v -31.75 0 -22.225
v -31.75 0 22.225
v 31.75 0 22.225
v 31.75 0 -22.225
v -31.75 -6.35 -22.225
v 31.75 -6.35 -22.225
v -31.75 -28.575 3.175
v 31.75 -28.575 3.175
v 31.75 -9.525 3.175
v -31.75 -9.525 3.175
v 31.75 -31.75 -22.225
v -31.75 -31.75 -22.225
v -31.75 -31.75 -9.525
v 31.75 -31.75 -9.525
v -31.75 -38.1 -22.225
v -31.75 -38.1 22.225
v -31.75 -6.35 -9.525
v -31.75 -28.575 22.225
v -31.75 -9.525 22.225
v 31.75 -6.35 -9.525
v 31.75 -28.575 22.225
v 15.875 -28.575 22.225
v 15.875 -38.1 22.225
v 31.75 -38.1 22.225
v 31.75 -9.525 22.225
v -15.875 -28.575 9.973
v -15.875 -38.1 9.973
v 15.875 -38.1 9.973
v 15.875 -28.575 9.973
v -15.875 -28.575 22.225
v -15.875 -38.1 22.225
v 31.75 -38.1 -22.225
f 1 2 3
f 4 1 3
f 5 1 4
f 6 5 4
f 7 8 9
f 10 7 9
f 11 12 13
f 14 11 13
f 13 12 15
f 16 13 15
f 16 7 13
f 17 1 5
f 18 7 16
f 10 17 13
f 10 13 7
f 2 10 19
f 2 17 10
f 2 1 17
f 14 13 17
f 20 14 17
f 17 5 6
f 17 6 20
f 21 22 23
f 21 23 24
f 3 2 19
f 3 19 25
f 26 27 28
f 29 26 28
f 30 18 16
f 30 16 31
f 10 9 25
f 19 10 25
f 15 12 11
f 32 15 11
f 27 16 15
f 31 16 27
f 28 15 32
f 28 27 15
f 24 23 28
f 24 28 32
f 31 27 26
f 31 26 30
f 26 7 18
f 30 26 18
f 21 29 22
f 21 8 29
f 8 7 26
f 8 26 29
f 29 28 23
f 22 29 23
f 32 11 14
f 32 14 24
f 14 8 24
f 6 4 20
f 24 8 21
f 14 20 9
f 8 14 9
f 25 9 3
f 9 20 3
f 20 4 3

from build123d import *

# Parameters (mm, degrees)
F0_W     = 63.5
F0_H     = 44.45
F1_DEPTH = 38.1
F2_W     = 19.05
F2_H     = 19.05
F3_DEPTH = 63.501
F4_W     = 31.75
F4_H     = 12.251506
F5_DEPTH = 9.525
F6_W     = 25.4
F6_H     = 12.7
F7_DEPTH = 63.501


with BuildPart() as f1:
    # F0 (on Front) → F1 (new body)
    with BuildSketch(Plane.XZ):
        Rectangle(F0_W, F0_H)
    extrude(amount=F1_DEPTH)

    # F2 (on face) → F3 (cut, through all)
    with BuildSketch(Plane.YZ.offset(31.75)):
        with Locations((-19.05, 12.7)):
            Rectangle(F2_W, F2_H)
    extrude(amount=-F3_DEPTH, mode=Mode.SUBTRACT)

    # F4 (on face) → F5 (cut)
    with BuildSketch(Plane.XZ.offset(38.1)):
        with Locations((0, 16.099247)):
            Rectangle(F4_W, F4_H)
    extrude(amount=-F5_DEPTH, mode=Mode.SUBTRACT)

    # F6 (on face) → F7 (cut, through all)
    with BuildSketch(Plane.YZ.offset(31.75)):
        with Locations((-19.05, -15.875)):
            Rectangle(F6_W, F6_H)
    extrude(amount=-F7_DEPTH, mode=Mode.SUBTRACT)


solid = f1.part
